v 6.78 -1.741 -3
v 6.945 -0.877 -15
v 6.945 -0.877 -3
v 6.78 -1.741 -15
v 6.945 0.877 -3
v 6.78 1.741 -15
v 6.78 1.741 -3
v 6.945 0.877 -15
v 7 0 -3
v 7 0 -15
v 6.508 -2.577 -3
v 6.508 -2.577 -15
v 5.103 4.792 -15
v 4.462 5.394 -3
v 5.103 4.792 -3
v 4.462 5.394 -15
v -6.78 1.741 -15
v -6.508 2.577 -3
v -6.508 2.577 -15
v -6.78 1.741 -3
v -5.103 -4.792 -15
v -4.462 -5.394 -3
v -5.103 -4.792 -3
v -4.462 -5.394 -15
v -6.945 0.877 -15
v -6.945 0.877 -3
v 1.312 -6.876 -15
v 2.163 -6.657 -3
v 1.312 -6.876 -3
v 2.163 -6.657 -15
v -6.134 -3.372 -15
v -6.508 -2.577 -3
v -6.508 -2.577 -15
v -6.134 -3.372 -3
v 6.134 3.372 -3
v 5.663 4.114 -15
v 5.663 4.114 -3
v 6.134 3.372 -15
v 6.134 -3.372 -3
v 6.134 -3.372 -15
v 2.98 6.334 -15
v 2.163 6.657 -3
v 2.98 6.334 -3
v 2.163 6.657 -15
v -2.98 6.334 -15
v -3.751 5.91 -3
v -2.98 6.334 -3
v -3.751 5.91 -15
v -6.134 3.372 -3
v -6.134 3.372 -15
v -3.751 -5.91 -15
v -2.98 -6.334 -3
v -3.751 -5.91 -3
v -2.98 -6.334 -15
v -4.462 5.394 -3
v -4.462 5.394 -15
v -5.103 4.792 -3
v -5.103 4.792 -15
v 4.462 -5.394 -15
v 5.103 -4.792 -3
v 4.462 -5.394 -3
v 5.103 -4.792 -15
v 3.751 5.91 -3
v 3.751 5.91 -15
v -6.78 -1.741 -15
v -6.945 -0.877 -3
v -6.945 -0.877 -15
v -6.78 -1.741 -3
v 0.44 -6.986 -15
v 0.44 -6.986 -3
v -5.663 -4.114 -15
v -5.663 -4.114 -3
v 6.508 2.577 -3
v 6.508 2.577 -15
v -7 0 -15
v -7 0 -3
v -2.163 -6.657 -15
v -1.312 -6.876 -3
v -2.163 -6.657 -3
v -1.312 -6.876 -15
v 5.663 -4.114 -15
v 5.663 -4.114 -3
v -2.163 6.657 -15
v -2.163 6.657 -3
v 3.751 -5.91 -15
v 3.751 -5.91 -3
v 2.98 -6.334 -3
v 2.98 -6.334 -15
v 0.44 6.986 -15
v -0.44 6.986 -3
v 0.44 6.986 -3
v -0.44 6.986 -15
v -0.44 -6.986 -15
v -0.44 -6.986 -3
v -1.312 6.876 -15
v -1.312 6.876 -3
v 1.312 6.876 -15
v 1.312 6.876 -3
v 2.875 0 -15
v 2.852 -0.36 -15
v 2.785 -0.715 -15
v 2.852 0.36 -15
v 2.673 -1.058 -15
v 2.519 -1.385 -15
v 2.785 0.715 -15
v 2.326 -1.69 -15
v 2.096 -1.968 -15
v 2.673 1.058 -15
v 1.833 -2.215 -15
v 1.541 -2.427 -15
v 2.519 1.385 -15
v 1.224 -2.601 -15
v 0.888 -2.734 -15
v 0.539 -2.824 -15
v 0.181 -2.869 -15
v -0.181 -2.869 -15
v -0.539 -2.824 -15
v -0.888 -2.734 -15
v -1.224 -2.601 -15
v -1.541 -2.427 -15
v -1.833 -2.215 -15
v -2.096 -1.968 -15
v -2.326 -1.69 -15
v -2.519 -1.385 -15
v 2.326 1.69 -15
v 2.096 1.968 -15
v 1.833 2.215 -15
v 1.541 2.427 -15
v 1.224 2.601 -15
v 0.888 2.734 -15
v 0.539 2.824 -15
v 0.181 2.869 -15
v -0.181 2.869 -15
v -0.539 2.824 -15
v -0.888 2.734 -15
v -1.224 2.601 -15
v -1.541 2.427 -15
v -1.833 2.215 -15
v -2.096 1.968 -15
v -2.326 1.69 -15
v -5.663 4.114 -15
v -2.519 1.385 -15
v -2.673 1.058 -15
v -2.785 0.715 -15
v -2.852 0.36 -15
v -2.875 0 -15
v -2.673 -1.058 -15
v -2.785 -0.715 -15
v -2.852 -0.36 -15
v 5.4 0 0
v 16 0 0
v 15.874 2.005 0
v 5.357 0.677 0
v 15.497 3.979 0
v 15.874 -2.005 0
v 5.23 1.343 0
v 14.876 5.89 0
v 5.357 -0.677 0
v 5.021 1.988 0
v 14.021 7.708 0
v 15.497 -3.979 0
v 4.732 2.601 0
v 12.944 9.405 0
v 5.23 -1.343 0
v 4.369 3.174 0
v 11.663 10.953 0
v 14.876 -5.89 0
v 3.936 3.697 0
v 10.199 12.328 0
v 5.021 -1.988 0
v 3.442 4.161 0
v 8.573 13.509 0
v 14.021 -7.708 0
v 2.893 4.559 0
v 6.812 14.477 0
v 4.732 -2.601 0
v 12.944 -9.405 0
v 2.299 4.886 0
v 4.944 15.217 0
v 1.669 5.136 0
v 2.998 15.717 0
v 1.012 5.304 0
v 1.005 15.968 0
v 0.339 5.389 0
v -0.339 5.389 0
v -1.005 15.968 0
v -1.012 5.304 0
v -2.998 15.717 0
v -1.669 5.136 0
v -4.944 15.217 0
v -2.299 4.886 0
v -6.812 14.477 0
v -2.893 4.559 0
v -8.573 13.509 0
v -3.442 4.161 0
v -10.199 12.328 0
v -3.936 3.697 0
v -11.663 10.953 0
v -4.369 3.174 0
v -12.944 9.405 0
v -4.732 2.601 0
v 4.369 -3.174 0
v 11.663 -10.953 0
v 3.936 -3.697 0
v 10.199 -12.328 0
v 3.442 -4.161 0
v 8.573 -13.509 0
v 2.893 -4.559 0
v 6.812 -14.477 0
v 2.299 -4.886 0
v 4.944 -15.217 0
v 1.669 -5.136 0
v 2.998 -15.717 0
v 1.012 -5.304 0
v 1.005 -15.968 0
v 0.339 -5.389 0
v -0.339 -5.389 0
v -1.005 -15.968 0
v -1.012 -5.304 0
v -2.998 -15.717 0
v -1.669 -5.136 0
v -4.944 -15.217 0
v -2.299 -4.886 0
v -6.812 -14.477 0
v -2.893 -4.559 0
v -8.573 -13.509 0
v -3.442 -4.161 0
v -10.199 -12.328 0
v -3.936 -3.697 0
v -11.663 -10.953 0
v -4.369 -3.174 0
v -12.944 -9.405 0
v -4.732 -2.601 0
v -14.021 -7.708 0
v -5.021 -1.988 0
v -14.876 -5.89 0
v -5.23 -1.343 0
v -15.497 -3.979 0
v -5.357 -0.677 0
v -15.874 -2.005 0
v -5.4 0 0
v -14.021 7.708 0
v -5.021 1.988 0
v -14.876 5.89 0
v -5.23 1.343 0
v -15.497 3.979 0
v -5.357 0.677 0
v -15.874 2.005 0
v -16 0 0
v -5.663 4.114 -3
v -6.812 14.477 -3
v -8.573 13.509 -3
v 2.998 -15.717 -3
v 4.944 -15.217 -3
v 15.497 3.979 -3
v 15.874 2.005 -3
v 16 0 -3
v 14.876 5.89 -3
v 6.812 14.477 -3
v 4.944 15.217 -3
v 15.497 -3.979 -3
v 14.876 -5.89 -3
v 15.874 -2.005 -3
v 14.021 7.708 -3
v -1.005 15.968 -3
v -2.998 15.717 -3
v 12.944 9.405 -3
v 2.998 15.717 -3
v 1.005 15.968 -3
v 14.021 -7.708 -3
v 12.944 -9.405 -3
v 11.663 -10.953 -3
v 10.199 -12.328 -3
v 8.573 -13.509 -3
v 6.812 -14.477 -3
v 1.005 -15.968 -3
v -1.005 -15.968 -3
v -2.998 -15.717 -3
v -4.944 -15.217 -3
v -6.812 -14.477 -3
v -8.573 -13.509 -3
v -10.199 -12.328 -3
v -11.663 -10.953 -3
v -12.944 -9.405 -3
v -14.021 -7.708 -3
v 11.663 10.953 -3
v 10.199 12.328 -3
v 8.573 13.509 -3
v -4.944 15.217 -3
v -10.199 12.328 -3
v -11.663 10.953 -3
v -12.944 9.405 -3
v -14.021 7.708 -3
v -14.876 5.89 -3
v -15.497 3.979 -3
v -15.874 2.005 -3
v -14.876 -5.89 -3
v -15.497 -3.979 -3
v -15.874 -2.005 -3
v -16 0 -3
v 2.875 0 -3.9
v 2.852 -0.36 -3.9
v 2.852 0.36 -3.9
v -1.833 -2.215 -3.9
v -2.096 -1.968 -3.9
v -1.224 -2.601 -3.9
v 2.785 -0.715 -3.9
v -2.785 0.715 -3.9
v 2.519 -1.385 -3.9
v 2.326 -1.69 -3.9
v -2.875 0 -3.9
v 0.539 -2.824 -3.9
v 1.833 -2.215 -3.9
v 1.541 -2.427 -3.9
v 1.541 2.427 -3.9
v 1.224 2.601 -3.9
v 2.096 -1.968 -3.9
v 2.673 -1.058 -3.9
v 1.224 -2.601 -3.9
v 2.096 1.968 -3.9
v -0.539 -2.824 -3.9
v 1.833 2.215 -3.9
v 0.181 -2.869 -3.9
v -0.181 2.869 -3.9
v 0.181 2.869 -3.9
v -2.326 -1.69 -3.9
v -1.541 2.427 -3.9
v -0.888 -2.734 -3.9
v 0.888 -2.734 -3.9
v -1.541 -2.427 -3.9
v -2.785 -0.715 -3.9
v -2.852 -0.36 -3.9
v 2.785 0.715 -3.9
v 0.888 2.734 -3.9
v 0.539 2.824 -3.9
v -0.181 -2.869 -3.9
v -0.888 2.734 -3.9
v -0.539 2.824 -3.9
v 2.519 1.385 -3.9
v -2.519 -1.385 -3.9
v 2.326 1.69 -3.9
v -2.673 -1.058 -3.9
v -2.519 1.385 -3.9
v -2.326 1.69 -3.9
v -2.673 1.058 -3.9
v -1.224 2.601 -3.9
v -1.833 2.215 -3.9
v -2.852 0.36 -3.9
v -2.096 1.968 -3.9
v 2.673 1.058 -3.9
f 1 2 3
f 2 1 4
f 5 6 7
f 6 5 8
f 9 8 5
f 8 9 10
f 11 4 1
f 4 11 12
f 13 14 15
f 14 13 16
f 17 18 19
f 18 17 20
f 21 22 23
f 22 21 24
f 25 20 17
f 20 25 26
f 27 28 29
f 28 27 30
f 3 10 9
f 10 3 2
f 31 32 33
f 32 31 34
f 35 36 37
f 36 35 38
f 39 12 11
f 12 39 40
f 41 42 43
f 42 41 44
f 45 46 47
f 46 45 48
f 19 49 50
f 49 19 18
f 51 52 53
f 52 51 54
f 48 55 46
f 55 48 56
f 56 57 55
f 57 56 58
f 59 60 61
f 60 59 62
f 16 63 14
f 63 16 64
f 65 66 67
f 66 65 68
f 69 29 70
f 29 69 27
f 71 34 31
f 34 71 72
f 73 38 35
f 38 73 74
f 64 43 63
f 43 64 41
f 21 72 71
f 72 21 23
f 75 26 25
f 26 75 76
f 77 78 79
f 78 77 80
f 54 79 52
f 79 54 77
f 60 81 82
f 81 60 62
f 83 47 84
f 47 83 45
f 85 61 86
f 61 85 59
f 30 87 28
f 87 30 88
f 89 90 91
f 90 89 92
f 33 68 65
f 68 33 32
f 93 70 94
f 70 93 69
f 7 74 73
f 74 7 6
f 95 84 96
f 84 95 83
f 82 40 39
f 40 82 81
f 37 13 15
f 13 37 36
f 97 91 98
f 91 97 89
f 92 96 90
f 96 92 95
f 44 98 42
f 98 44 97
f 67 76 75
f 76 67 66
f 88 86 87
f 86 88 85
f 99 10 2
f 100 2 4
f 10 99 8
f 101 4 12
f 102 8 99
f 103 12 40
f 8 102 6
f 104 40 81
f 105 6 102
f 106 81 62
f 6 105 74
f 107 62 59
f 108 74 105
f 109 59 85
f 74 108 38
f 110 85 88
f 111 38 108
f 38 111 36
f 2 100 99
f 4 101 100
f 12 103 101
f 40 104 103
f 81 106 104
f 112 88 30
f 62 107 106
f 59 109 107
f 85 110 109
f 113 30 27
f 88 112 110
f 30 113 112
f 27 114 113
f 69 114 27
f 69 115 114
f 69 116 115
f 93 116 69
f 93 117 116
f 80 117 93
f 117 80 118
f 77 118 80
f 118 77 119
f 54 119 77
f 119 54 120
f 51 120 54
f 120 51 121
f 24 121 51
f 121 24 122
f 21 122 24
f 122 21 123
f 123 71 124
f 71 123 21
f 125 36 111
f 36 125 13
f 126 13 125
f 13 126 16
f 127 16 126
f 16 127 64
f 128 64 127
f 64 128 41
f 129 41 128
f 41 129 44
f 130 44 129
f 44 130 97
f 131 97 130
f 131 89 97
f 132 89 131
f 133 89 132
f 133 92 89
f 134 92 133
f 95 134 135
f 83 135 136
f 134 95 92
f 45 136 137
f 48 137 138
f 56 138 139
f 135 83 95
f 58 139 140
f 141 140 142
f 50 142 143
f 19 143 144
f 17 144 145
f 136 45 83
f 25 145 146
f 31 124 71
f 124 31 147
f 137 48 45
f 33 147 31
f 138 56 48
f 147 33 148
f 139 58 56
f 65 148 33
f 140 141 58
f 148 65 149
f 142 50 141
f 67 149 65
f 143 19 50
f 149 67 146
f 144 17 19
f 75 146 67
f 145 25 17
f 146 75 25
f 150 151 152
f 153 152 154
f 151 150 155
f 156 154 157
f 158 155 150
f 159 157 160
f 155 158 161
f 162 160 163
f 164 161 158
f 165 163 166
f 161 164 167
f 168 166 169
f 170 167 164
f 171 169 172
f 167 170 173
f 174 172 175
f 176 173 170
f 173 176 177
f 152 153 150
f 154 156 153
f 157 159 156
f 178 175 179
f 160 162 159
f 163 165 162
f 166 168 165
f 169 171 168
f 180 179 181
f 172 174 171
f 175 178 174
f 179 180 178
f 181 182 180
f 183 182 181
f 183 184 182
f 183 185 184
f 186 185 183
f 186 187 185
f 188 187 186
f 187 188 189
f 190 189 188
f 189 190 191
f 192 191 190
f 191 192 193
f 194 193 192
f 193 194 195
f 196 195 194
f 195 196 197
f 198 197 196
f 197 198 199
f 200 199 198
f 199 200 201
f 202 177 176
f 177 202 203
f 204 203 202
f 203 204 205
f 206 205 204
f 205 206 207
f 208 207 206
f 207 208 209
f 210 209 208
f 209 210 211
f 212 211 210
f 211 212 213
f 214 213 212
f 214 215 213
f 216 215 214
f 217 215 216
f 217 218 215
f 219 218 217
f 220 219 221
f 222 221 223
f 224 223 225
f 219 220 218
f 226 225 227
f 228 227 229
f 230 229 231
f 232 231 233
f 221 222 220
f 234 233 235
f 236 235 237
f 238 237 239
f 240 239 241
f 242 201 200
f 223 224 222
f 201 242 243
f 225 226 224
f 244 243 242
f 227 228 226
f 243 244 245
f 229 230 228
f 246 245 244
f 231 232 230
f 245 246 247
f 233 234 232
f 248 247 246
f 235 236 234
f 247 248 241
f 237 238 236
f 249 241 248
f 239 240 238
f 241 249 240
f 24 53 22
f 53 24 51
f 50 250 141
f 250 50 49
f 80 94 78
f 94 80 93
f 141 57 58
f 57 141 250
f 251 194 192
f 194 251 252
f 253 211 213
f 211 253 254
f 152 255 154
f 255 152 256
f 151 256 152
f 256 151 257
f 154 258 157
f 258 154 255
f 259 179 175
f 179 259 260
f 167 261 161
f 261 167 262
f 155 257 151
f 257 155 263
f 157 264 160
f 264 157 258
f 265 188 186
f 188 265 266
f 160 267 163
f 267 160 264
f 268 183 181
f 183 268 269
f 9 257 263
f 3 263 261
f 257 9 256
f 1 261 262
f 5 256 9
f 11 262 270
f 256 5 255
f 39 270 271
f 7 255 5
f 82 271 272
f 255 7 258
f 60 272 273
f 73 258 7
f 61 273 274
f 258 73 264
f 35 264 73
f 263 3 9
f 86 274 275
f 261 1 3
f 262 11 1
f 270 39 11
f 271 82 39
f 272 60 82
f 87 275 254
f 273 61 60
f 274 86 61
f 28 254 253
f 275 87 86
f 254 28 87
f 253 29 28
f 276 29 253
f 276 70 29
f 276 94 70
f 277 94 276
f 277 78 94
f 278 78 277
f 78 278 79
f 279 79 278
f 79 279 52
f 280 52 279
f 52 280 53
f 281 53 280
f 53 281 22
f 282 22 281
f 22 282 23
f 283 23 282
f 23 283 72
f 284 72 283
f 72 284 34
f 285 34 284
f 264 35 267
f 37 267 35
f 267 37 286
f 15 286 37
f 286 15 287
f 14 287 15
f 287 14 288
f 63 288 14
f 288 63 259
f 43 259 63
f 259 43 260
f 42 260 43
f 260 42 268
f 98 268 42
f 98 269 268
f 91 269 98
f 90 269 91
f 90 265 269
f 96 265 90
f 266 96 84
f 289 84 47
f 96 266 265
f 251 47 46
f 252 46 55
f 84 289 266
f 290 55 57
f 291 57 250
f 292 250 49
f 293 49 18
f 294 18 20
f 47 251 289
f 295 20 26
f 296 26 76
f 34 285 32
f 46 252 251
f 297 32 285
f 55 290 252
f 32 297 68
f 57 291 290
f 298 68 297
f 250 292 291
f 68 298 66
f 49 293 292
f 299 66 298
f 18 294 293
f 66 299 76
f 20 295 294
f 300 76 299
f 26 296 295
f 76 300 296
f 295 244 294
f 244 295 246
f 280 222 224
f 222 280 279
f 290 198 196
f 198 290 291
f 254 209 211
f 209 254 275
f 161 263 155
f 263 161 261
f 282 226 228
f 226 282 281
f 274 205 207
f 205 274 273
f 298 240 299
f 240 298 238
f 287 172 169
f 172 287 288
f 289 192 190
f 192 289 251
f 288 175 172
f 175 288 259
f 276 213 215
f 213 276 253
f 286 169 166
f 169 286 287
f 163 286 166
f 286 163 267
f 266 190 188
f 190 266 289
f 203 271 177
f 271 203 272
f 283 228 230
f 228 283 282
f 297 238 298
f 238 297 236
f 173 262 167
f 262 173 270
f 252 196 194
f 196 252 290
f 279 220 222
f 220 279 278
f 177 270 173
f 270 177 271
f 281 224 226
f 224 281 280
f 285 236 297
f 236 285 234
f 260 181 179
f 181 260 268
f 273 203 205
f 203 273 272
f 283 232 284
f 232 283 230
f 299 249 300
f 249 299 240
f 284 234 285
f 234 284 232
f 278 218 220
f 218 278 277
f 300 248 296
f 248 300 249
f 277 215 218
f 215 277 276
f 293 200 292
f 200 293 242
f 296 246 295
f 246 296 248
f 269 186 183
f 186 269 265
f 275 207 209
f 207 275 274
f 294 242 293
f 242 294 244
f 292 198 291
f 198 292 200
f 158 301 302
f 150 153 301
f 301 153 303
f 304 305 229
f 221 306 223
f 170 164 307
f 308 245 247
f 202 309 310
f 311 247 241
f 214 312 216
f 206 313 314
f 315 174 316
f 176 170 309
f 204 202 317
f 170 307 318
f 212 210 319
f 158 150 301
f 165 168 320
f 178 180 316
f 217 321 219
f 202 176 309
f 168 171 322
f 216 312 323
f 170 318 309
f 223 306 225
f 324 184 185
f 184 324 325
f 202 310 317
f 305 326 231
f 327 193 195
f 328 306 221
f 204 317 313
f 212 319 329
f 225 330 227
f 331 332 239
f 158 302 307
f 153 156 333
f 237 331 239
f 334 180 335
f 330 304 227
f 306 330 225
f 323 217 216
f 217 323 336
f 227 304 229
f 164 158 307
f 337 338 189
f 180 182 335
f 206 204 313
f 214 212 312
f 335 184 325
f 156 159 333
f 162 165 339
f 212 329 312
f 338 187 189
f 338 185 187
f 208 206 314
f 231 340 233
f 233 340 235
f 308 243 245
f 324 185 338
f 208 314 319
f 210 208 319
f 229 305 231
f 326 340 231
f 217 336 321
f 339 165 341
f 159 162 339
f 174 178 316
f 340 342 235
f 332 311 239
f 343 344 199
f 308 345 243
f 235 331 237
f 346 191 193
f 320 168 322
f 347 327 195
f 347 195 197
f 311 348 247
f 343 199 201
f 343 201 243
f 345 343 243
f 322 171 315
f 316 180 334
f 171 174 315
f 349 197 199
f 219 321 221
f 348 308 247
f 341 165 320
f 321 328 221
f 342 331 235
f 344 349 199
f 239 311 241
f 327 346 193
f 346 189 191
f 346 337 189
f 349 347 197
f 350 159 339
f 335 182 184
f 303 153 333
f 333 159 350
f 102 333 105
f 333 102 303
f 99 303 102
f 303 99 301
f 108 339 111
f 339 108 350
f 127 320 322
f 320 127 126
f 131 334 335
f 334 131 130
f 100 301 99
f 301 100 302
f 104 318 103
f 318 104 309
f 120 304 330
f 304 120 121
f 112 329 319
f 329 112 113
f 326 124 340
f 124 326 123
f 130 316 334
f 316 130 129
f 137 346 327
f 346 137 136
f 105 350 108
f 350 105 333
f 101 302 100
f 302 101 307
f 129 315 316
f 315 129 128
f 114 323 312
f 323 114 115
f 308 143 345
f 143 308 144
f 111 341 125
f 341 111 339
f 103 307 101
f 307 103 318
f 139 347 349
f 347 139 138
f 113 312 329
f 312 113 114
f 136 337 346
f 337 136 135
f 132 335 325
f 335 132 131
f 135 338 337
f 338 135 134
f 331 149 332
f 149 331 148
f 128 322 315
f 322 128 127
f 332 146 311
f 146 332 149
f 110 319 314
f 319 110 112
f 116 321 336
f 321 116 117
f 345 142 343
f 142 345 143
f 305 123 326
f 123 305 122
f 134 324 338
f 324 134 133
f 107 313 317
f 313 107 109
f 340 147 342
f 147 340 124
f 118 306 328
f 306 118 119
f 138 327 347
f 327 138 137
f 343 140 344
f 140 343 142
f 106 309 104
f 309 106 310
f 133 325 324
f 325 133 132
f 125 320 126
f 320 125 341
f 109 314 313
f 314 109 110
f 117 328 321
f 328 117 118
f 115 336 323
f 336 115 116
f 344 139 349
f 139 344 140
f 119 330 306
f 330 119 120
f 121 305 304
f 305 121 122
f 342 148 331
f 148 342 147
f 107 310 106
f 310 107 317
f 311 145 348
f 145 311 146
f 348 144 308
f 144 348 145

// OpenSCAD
$fn = 50;


difference() {
	union() {
		translate(v = [0, 0, -15.0000000000]) {
			cylinder(h = 15, r = 7.0000000000);
		}
		translate(v = [0, 0, -3.0000000000]) {
			cylinder(h = 3, r = 16.0000000000);
		}
	}
	union() {
		translate(v = [0, 0, 0]) {
			rotate(a = [0, 0, 0]) {
				difference() {
					union() {
						#translate(v = [0, 0, -15.0000000000]) {
							cylinder(h = 15, r = 2.6000000000);
						}
						#translate(v = [0, 0, -3.9000000000]) {
							cylinder(h = 3.9000000000, r = 7.0000000000, r1 = 2.8750000000, r2 = 5.4000000000);
						}
						#translate(v = [0, 0, -15.0000000000]) {
							cylinder(h = 15, r = 2.8750000000);
						}
						#translate(v = [0, 0, -15.0000000000]) {
							cylinder(h = 15, r = 2.6000000000);
						}
					}
					union();
				}
			}
		}
	}
}
